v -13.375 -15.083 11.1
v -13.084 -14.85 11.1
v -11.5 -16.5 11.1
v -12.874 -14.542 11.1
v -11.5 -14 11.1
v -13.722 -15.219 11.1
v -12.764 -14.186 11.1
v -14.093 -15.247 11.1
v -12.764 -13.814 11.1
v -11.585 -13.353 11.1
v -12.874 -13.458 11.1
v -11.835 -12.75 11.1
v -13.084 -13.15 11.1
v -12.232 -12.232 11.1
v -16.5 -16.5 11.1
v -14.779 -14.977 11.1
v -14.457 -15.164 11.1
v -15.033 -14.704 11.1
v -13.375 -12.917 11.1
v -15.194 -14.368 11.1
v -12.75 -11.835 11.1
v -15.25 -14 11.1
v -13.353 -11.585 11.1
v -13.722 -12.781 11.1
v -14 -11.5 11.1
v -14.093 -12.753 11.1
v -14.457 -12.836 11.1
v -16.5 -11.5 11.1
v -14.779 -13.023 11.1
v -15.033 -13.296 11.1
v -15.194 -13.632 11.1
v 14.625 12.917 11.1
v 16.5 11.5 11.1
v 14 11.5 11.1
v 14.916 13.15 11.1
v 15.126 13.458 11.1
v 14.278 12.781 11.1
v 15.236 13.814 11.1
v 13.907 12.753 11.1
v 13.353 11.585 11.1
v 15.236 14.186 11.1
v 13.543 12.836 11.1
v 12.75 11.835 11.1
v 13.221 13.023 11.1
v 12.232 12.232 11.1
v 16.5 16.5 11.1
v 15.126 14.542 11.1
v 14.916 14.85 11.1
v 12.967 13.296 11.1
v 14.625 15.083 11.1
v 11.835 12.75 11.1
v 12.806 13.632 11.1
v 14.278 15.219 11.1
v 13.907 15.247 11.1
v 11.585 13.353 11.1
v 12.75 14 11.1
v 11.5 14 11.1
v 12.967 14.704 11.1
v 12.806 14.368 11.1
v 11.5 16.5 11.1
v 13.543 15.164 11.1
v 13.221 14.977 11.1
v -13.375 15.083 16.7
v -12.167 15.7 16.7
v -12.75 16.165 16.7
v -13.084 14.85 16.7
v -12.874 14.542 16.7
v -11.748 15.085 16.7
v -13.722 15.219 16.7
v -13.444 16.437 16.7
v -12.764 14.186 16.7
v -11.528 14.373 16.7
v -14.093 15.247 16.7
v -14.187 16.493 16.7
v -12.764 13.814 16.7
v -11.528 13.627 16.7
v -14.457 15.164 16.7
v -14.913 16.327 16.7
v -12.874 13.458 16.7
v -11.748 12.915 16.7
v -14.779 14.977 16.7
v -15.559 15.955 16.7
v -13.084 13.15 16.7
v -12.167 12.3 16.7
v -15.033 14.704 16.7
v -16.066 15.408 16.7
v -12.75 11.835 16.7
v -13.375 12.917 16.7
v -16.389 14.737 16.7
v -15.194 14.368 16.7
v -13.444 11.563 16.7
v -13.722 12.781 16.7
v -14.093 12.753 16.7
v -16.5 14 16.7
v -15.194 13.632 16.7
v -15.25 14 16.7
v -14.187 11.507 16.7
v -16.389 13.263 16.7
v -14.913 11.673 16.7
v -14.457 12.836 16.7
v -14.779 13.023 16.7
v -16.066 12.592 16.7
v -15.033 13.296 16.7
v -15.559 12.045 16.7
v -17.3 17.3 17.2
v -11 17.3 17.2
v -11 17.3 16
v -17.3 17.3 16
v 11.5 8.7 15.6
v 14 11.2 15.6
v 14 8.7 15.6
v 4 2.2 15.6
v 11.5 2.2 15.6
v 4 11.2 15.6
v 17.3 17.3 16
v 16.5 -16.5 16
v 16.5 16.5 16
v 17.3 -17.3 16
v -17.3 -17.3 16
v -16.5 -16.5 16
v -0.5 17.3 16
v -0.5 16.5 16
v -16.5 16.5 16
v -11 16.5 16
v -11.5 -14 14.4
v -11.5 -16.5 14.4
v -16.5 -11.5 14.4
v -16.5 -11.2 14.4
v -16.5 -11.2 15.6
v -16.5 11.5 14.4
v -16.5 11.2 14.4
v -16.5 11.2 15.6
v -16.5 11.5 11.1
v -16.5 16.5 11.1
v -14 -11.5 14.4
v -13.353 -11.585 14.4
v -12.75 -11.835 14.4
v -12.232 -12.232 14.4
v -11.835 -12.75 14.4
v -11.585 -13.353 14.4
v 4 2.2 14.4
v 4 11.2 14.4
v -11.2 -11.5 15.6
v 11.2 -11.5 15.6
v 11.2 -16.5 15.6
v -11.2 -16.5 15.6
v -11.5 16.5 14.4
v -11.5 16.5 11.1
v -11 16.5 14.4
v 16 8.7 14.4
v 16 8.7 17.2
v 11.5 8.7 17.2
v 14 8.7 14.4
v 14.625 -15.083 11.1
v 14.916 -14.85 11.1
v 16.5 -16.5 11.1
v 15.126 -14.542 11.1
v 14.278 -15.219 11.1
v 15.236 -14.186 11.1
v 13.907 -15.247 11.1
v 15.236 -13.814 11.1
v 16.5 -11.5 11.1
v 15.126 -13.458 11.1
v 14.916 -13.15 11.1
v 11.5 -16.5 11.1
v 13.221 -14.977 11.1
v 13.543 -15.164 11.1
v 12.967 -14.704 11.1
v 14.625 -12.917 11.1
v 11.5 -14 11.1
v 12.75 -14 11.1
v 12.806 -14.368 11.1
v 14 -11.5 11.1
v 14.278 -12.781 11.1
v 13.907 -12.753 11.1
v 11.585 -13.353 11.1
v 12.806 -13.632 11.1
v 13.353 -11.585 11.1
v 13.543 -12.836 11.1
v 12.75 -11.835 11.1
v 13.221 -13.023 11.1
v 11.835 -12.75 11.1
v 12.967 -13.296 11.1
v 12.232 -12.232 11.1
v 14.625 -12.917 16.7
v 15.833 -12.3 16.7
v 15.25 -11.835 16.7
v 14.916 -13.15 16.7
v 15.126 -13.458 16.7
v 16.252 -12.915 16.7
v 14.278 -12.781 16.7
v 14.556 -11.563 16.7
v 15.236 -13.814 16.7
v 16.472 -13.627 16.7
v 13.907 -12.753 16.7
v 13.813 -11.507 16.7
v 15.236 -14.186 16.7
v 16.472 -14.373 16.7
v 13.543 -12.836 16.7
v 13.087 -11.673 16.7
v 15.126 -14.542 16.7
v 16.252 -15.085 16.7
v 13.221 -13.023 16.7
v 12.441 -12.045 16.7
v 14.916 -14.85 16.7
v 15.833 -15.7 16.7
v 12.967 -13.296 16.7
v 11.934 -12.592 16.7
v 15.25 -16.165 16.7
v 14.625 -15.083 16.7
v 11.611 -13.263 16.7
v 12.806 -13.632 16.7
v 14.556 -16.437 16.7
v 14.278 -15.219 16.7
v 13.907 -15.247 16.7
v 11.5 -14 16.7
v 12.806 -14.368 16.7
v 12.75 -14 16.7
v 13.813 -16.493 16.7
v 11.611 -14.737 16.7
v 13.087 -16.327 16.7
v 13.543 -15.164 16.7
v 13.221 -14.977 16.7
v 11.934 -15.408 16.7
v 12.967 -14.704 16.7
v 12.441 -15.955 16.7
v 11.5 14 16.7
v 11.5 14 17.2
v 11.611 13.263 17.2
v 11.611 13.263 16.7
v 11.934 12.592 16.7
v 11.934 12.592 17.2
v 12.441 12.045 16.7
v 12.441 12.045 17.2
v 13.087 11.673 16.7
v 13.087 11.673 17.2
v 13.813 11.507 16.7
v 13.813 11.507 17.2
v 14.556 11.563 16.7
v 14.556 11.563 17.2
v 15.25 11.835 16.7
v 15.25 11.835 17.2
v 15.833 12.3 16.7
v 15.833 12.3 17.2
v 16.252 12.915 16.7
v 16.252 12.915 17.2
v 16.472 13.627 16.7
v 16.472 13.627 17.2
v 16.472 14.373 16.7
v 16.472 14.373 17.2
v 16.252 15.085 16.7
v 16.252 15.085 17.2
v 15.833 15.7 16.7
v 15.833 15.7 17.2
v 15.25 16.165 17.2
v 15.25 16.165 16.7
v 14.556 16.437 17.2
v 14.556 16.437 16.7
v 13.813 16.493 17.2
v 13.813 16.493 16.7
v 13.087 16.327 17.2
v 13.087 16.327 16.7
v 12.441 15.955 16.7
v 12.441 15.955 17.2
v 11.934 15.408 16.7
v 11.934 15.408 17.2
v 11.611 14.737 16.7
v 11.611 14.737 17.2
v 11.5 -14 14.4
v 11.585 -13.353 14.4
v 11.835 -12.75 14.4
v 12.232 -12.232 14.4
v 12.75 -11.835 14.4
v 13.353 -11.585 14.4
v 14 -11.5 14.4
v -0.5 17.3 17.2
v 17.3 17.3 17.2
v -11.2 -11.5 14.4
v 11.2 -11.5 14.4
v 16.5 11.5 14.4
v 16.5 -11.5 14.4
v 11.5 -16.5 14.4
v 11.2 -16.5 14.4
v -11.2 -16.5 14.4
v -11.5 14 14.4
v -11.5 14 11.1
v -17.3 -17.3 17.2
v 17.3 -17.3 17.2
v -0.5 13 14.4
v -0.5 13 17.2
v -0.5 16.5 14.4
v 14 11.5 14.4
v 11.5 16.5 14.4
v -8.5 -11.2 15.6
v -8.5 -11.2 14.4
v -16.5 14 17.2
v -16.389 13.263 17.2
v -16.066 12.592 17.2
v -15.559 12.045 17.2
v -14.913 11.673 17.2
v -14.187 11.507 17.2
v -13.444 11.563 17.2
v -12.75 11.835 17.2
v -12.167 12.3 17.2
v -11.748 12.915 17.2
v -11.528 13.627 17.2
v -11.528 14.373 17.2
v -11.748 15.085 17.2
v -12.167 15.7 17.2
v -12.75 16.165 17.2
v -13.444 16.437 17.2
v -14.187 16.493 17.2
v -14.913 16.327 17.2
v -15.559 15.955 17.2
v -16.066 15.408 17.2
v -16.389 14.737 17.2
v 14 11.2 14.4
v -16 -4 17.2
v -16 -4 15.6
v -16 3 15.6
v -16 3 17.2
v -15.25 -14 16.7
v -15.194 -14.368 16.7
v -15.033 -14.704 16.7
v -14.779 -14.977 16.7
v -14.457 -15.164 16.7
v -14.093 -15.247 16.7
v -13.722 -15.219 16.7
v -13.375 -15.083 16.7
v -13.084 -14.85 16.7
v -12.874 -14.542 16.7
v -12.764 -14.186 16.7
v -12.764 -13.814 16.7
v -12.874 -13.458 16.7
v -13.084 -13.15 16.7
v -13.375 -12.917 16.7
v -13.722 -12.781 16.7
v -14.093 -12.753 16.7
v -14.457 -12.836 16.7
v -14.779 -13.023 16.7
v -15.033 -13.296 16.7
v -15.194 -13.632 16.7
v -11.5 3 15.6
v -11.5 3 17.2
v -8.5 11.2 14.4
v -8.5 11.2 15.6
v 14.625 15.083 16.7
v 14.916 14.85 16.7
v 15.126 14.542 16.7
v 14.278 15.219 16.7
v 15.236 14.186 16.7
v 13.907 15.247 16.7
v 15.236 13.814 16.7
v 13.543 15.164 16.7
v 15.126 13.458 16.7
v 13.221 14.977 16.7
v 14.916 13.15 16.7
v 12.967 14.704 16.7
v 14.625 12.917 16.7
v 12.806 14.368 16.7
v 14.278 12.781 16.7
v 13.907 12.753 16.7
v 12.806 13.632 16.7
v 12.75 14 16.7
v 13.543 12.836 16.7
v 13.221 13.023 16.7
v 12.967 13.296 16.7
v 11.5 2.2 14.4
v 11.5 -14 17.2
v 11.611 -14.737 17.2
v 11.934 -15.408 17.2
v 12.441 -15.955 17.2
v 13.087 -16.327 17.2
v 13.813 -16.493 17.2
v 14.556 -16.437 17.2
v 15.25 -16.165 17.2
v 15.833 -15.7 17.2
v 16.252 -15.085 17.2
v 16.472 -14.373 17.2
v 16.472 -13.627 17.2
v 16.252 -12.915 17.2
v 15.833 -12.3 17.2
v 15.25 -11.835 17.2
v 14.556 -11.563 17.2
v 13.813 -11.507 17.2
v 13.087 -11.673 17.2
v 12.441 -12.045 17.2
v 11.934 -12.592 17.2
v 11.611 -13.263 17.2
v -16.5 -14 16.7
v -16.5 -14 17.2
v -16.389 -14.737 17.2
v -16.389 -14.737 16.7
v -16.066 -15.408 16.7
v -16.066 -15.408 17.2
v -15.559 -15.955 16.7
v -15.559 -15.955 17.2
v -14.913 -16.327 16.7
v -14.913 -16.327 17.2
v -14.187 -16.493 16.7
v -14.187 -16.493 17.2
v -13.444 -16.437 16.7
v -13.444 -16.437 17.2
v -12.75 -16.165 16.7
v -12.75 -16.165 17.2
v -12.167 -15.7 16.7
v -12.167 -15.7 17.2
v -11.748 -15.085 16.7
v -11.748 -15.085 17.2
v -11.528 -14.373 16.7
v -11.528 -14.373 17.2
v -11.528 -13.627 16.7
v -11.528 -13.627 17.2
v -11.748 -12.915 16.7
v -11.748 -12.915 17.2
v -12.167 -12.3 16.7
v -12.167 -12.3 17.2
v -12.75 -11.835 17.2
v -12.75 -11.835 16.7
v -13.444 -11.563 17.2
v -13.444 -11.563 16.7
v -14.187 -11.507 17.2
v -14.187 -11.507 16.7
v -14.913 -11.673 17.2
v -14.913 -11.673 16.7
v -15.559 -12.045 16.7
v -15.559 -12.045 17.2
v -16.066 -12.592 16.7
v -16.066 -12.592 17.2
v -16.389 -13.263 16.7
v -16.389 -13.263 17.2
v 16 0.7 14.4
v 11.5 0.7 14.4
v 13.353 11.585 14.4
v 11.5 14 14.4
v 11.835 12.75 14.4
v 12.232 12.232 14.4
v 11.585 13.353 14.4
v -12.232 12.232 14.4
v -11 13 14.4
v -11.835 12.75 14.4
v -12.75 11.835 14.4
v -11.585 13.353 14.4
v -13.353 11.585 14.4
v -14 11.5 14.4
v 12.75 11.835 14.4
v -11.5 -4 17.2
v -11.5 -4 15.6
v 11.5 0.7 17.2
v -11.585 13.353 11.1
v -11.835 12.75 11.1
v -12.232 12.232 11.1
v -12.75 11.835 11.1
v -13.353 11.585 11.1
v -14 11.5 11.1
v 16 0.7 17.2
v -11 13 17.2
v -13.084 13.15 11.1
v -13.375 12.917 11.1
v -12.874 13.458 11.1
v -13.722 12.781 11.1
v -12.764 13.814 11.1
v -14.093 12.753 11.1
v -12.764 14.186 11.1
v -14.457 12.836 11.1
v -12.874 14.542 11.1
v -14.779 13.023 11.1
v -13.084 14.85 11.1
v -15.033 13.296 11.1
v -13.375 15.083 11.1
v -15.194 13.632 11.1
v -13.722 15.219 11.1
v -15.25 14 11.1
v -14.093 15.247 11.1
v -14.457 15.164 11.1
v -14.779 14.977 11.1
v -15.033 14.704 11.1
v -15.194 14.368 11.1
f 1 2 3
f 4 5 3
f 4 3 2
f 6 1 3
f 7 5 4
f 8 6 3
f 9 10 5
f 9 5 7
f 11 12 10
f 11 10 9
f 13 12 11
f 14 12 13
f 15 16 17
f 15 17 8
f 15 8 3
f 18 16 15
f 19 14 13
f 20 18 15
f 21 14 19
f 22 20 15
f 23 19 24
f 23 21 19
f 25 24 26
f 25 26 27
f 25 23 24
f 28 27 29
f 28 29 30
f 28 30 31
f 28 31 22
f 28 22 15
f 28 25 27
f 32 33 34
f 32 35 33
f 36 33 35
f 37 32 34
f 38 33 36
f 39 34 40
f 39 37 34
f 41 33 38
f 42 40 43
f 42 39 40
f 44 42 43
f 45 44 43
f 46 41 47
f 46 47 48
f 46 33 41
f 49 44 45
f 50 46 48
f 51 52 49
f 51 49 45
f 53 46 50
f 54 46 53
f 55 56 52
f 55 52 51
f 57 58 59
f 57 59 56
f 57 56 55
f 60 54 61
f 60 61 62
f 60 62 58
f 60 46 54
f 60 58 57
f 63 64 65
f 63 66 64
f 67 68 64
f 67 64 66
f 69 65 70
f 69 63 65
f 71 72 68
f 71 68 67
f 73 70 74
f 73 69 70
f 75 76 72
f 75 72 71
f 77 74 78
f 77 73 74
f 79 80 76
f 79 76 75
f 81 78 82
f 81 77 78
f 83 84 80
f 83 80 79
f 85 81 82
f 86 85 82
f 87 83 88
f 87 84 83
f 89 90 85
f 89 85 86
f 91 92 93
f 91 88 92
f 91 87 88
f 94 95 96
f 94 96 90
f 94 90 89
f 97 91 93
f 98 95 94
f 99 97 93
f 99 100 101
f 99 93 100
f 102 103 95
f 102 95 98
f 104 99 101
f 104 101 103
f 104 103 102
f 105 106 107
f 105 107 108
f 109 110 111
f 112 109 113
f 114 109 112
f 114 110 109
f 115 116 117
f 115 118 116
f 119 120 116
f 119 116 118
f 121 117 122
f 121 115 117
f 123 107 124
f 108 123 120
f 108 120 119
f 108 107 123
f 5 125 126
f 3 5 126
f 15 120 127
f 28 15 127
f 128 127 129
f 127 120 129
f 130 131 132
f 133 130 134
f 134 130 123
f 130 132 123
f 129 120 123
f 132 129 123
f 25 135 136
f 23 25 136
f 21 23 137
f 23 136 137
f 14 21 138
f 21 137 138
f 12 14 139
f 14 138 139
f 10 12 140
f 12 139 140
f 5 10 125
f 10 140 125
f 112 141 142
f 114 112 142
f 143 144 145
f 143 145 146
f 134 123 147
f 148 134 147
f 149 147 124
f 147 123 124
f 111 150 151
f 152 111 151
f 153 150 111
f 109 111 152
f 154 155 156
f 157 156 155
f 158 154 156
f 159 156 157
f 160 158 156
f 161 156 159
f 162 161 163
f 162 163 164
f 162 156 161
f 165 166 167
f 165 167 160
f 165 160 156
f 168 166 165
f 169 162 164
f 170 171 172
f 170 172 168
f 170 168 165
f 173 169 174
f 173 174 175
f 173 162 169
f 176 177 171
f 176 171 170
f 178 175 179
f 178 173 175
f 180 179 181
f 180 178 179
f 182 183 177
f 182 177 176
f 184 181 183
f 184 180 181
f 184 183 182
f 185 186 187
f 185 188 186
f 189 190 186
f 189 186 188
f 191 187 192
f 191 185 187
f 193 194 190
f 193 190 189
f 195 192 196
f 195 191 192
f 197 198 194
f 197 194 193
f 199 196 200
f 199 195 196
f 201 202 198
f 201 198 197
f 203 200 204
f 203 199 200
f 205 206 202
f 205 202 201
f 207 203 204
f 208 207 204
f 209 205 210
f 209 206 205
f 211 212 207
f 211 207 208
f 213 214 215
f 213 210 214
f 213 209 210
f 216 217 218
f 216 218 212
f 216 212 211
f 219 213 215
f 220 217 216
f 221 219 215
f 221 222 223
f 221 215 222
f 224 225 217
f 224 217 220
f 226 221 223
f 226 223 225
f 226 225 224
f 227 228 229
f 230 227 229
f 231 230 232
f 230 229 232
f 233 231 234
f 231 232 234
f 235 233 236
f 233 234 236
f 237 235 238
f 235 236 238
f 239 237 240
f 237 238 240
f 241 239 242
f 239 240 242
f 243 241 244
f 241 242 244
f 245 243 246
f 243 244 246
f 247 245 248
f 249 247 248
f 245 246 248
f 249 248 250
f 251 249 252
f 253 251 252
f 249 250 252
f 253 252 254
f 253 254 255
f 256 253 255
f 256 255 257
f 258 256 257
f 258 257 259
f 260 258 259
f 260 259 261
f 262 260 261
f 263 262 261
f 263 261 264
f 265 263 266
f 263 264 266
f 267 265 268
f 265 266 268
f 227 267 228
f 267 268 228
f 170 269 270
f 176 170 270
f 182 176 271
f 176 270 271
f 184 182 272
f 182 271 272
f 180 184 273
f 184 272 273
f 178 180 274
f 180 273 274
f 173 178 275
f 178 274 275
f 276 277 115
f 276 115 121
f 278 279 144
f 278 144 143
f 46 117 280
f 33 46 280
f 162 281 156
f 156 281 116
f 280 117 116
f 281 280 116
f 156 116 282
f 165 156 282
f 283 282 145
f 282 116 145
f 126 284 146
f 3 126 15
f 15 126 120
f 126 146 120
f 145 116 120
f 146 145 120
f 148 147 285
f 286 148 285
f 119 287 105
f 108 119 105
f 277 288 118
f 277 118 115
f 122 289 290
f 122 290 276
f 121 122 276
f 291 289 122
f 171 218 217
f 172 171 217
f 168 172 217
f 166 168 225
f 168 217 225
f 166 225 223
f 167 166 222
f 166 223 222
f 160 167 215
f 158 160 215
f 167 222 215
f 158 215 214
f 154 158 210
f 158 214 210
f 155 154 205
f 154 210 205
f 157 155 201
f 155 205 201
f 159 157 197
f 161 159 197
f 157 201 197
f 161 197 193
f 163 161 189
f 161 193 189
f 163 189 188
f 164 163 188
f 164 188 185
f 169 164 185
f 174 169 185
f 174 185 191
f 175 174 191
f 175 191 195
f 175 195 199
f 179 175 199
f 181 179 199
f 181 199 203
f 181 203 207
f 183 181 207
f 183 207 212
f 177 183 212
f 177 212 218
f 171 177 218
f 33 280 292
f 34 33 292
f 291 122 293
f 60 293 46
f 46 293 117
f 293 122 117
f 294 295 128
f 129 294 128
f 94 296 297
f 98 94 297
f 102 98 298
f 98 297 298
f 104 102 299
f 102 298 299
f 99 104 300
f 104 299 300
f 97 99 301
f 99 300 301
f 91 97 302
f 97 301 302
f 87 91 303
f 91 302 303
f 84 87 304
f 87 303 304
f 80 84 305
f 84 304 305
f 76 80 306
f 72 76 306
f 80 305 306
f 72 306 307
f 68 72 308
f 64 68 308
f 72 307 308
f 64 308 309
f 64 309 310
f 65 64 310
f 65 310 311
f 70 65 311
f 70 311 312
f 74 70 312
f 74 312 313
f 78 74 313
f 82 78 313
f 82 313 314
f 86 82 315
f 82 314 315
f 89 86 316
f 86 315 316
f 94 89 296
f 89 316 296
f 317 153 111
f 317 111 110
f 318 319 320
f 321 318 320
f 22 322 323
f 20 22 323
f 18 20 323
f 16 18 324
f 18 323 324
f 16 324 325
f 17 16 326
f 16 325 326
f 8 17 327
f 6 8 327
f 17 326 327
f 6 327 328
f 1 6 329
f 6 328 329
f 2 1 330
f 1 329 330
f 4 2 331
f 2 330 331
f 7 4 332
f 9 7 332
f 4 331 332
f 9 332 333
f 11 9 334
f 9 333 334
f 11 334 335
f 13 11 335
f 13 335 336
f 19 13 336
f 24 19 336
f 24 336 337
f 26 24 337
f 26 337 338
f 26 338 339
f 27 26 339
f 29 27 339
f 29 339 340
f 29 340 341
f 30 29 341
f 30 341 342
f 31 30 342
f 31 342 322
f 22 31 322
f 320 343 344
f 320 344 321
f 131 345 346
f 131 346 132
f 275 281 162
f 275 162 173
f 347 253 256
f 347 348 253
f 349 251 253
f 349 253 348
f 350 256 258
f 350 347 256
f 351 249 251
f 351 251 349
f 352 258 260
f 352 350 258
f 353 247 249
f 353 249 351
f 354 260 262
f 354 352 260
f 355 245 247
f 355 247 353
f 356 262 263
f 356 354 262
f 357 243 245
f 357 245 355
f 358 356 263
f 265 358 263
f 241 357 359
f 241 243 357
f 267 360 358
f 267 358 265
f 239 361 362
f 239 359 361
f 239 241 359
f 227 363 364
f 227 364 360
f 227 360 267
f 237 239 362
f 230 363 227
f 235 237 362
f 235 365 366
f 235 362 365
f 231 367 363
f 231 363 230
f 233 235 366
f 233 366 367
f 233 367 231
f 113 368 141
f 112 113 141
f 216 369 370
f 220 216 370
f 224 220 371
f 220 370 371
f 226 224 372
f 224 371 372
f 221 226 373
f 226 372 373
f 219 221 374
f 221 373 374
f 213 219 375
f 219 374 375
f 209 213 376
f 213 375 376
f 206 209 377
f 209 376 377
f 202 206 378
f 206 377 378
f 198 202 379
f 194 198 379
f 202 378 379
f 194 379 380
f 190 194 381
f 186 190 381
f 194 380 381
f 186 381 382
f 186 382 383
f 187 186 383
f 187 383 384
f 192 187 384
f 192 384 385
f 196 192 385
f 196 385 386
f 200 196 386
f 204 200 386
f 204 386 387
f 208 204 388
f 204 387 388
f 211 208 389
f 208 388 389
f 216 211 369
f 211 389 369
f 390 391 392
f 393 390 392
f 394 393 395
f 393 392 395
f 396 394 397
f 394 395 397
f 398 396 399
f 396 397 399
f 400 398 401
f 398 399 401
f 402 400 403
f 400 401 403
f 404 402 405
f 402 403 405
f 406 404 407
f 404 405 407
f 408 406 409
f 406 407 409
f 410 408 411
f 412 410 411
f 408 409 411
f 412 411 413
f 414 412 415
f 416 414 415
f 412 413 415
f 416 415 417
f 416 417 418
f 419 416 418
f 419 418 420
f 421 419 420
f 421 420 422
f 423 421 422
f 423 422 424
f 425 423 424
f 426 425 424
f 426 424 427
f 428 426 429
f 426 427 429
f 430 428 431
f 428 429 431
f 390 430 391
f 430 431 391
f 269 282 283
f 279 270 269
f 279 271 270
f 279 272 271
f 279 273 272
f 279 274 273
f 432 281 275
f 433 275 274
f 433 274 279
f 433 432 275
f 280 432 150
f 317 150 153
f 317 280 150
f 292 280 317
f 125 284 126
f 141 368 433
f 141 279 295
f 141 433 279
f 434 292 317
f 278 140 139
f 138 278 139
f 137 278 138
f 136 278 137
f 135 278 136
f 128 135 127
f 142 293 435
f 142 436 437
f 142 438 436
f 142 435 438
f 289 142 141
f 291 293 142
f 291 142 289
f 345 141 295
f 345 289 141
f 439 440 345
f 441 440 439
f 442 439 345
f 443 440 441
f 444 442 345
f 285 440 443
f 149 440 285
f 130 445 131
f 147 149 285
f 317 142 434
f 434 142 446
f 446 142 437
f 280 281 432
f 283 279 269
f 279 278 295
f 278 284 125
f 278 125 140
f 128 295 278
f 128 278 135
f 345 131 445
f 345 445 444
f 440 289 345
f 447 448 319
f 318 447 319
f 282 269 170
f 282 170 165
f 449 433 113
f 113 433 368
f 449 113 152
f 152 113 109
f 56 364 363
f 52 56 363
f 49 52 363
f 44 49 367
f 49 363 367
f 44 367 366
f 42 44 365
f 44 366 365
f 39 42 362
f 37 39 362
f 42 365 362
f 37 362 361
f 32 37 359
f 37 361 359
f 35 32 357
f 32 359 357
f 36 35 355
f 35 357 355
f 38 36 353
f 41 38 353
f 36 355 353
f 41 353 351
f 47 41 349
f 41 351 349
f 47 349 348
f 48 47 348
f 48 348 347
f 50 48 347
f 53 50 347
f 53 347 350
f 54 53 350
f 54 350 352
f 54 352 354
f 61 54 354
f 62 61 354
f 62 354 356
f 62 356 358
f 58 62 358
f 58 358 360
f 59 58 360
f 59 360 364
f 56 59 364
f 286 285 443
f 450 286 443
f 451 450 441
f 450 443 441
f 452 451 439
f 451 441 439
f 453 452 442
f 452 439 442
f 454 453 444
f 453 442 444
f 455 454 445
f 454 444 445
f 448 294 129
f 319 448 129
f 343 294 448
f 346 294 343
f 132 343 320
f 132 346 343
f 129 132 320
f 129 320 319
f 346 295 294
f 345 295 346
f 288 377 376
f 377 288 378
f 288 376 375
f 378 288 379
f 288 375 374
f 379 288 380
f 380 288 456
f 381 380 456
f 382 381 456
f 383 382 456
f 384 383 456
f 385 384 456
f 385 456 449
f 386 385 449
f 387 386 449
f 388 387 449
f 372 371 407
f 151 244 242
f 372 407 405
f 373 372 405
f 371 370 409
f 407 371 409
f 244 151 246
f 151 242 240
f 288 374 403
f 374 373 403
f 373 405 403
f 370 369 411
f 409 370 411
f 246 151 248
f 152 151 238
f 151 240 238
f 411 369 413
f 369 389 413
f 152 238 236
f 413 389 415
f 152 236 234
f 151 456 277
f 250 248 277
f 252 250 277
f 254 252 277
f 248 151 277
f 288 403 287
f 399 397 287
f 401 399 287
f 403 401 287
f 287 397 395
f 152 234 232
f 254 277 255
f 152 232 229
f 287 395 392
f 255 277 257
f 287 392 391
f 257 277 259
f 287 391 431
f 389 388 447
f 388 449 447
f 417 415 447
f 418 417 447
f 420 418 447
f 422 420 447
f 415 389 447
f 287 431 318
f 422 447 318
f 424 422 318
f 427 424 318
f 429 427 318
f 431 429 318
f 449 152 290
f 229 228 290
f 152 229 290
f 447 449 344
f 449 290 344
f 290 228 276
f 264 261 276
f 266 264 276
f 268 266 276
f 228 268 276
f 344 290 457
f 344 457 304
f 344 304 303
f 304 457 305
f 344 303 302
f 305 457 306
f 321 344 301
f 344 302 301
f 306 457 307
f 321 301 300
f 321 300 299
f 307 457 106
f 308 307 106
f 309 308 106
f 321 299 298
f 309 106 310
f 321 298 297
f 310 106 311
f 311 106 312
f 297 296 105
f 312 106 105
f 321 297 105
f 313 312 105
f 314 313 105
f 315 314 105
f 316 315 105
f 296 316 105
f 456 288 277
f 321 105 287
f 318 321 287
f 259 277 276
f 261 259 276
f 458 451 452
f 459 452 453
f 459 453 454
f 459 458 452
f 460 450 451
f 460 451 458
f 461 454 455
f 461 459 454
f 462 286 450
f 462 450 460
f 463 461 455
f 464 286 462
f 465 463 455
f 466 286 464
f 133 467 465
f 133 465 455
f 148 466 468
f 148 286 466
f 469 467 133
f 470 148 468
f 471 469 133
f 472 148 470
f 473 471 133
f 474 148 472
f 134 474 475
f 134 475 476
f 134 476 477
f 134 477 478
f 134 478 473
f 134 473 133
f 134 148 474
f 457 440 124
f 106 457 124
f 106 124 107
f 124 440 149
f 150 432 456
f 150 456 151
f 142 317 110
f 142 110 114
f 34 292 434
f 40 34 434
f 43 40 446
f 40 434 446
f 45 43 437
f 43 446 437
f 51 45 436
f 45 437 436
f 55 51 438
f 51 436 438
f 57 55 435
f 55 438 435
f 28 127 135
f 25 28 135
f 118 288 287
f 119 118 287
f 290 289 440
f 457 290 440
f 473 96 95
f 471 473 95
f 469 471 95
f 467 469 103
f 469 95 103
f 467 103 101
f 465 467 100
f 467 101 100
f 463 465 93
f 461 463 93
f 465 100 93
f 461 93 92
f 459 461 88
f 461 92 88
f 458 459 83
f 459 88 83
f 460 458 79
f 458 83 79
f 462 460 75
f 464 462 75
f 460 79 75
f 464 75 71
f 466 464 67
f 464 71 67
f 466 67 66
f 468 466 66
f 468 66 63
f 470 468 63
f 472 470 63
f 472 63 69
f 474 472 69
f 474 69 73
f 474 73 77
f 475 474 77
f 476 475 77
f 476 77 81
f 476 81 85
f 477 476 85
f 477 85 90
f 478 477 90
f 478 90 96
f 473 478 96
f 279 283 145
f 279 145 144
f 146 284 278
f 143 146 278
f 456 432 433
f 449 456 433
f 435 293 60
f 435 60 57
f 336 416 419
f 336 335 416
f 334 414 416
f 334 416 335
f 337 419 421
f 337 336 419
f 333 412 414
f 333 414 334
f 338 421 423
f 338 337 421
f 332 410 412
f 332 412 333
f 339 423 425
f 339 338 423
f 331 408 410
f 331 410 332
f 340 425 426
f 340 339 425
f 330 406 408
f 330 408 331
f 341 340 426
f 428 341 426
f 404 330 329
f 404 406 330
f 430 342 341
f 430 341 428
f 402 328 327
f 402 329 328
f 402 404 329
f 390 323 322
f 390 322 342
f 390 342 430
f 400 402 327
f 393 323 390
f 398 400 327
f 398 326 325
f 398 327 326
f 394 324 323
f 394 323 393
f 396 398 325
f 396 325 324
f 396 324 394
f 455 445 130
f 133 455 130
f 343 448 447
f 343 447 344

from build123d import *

# Parameters (mm, degrees)
CLONE2D_W                = 34.6
CLONE2D_H                = 34.6
PAD004_DEPTH             = 1.2
SKETCH019_W              = 33
SKETCH019_H              = 33
PAD005_DEPTH             = 1.6
PAD006_DEPTH             = 3.3
SKETCH021_W              = 8
SKETCH021_H              = 22.4
SKETCH021_W_2            = 22.4
SKETCH021_H_2            = 5
SKETCH021_W_3            = 10
SKETCH021_H_3            = 9
POCKET014_DEPTH          = 1.2
SKETCH022_R              = 2.5
POCKET015_DEPTH          = 0.5
SKETCH023_R              = 1.25
POCKET016_DEPTH          = 6.101
SKETCH024_W              = 10.5
SKETCH024_H              = 4.5
SKETCH024_W_2            = 4.5
SKETCH024_H_2            = 8
SKETCH024_H_3            = 7
POCKET017_DEPTH          = 2.801
CLONE002_PLACEMENT_ANGLE = 180


with BuildPart() as part:
    # Clone2D → Pad004 (new body)
    with BuildSketch(Plane.XY):
        Rectangle(CLONE2D_W, CLONE2D_H)
    extrude(amount=PAD004_DEPTH)

    # Sketch019 → Pad005 (new body)
    with BuildSketch(Plane.XY.offset(1.2)):
        Rectangle(SKETCH019_W, SKETCH019_H)
    extrude(amount=PAD005_DEPTH)

    # Sketch020 → Pad006 (new body)
    with BuildSketch(Plane.XY.offset(2.8)):
        with BuildLine():
            ThreePointArc((-14, 11.5), (-12.232233, 12.232233), (-11.5, 14))
            Line((-11.5, 16.5), (-11.5, 14))
            Line((-11.5, 16.5), (-16.5, 16.5))
            Line((-16.5, 16.5), (-16.5, 11.5))
            Line((-16.5, 11.5), (-14, 11.5))
        make_face()
        with BuildLine():
            ThreePointArc((11.5, 14), (12.232233, 12.232233), (14, 11.5))
            Line((14, 11.5), (16.5, 11.5))
            Line((16.5, 11.5), (16.5, 16.5))
            Line((16.5, 16.5), (11.5, 16.5))
            Line((11.5, 16.5), (11.5, 14))
        make_face()
        with BuildLine():
            ThreePointArc((-11.5, -14), (-12.232233, -12.232233), (-14, -11.5))
            Line((-16.5, -11.5), (-14, -11.5))
            Line((-16.5, -16.5), (-16.5, -11.5))
            Line((-11.5, -16.5), (-16.5, -16.5))
            Line((-11.5, -14), (-11.5, -16.5))
        make_face()
        with BuildLine():
            ThreePointArc((14, -11.5), (12.232233, -12.232233), (11.5, -14))
            Line((11.5, -14), (11.5, -16.5))
            Line((11.5, -16.5), (16.5, -16.5))
            Line((16.5, -16.5), (16.5, -11.5))
            Line((16.5, -11.5), (14, -11.5))
        make_face()
    extrude(amount=PAD006_DEPTH)

    # Sketch021 → Pocket014 (cut)
    with BuildSketch(Plane.XY.offset(2.8)):
        with Locations((12.5, 0)):
            Rectangle(SKETCH021_W, SKETCH021_H)
        with Locations((0, -14)):
            Rectangle(SKETCH021_W_2, SKETCH021_H_2)
        with Locations((-9, 6.7)):
            Rectangle(SKETCH021_W_3, SKETCH021_H_3)
    extrude(amount=-POCKET014_DEPTH, mode=Mode.SUBTRACT)

    # Sketch022 → Pocket015 (cut)
    with BuildSketch(Plane(origin=(0, 0, 0), x_dir=(1, 0, 0), z_dir=(0, 0, -1))):
        with Locations((-14, 14)):
            Circle(SKETCH022_R)
        with Locations((14, 14)):
            Circle(SKETCH022_R)
        with Locations((-14, -14)):
            Circle(SKETCH022_R)
        with Locations((14, -14)):
            Circle(SKETCH022_R)
    extrude(amount=-POCKET015_DEPTH, mode=Mode.SUBTRACT)

    # Sketch023 → Pocket016 (cut, through all)
    with BuildSketch(Plane(origin=(0, 0, 0), x_dir=(1, 0, 0), z_dir=(0, 0, -1))):
        with Locations((-14, 14)):
            Circle(SKETCH023_R)
        with Locations((14, 14)):
            Circle(SKETCH023_R)
        with Locations((-14, -14)):
            Circle(SKETCH023_R)
        with Locations((14, -14)):
            Circle(SKETCH023_R)
    extrude(amount=-POCKET016_DEPTH, mode=Mode.SUBTRACT)

    # Sketch024 → Pocket017 (cut, through all)
    with BuildSketch(Plane.XY.offset(2.8)):
        with Locations((5.75, 15.25)):
            Rectangle(SKETCH024_W, SKETCH024_H)
        with Locations((-13.75, 4.7)):
            Rectangle(SKETCH024_W_2, SKETCH024_H_2)
        with Locations((13.75, -0.5)):
            Rectangle(SKETCH024_W_2, SKETCH024_H_3)
    extrude(amount=-POCKET017_DEPTH, mode=Mode.SUBTRACT)


with BuildPart() as part_1:
    # Clone002 placement: moved
    add(part.part.moved(Location((0, 0, 17.2))).rotate(Axis((0, 0, 17.2), (0, 1, 0)), CLONE002_PLACEMENT_ANGLE))


solid = part_1.part
